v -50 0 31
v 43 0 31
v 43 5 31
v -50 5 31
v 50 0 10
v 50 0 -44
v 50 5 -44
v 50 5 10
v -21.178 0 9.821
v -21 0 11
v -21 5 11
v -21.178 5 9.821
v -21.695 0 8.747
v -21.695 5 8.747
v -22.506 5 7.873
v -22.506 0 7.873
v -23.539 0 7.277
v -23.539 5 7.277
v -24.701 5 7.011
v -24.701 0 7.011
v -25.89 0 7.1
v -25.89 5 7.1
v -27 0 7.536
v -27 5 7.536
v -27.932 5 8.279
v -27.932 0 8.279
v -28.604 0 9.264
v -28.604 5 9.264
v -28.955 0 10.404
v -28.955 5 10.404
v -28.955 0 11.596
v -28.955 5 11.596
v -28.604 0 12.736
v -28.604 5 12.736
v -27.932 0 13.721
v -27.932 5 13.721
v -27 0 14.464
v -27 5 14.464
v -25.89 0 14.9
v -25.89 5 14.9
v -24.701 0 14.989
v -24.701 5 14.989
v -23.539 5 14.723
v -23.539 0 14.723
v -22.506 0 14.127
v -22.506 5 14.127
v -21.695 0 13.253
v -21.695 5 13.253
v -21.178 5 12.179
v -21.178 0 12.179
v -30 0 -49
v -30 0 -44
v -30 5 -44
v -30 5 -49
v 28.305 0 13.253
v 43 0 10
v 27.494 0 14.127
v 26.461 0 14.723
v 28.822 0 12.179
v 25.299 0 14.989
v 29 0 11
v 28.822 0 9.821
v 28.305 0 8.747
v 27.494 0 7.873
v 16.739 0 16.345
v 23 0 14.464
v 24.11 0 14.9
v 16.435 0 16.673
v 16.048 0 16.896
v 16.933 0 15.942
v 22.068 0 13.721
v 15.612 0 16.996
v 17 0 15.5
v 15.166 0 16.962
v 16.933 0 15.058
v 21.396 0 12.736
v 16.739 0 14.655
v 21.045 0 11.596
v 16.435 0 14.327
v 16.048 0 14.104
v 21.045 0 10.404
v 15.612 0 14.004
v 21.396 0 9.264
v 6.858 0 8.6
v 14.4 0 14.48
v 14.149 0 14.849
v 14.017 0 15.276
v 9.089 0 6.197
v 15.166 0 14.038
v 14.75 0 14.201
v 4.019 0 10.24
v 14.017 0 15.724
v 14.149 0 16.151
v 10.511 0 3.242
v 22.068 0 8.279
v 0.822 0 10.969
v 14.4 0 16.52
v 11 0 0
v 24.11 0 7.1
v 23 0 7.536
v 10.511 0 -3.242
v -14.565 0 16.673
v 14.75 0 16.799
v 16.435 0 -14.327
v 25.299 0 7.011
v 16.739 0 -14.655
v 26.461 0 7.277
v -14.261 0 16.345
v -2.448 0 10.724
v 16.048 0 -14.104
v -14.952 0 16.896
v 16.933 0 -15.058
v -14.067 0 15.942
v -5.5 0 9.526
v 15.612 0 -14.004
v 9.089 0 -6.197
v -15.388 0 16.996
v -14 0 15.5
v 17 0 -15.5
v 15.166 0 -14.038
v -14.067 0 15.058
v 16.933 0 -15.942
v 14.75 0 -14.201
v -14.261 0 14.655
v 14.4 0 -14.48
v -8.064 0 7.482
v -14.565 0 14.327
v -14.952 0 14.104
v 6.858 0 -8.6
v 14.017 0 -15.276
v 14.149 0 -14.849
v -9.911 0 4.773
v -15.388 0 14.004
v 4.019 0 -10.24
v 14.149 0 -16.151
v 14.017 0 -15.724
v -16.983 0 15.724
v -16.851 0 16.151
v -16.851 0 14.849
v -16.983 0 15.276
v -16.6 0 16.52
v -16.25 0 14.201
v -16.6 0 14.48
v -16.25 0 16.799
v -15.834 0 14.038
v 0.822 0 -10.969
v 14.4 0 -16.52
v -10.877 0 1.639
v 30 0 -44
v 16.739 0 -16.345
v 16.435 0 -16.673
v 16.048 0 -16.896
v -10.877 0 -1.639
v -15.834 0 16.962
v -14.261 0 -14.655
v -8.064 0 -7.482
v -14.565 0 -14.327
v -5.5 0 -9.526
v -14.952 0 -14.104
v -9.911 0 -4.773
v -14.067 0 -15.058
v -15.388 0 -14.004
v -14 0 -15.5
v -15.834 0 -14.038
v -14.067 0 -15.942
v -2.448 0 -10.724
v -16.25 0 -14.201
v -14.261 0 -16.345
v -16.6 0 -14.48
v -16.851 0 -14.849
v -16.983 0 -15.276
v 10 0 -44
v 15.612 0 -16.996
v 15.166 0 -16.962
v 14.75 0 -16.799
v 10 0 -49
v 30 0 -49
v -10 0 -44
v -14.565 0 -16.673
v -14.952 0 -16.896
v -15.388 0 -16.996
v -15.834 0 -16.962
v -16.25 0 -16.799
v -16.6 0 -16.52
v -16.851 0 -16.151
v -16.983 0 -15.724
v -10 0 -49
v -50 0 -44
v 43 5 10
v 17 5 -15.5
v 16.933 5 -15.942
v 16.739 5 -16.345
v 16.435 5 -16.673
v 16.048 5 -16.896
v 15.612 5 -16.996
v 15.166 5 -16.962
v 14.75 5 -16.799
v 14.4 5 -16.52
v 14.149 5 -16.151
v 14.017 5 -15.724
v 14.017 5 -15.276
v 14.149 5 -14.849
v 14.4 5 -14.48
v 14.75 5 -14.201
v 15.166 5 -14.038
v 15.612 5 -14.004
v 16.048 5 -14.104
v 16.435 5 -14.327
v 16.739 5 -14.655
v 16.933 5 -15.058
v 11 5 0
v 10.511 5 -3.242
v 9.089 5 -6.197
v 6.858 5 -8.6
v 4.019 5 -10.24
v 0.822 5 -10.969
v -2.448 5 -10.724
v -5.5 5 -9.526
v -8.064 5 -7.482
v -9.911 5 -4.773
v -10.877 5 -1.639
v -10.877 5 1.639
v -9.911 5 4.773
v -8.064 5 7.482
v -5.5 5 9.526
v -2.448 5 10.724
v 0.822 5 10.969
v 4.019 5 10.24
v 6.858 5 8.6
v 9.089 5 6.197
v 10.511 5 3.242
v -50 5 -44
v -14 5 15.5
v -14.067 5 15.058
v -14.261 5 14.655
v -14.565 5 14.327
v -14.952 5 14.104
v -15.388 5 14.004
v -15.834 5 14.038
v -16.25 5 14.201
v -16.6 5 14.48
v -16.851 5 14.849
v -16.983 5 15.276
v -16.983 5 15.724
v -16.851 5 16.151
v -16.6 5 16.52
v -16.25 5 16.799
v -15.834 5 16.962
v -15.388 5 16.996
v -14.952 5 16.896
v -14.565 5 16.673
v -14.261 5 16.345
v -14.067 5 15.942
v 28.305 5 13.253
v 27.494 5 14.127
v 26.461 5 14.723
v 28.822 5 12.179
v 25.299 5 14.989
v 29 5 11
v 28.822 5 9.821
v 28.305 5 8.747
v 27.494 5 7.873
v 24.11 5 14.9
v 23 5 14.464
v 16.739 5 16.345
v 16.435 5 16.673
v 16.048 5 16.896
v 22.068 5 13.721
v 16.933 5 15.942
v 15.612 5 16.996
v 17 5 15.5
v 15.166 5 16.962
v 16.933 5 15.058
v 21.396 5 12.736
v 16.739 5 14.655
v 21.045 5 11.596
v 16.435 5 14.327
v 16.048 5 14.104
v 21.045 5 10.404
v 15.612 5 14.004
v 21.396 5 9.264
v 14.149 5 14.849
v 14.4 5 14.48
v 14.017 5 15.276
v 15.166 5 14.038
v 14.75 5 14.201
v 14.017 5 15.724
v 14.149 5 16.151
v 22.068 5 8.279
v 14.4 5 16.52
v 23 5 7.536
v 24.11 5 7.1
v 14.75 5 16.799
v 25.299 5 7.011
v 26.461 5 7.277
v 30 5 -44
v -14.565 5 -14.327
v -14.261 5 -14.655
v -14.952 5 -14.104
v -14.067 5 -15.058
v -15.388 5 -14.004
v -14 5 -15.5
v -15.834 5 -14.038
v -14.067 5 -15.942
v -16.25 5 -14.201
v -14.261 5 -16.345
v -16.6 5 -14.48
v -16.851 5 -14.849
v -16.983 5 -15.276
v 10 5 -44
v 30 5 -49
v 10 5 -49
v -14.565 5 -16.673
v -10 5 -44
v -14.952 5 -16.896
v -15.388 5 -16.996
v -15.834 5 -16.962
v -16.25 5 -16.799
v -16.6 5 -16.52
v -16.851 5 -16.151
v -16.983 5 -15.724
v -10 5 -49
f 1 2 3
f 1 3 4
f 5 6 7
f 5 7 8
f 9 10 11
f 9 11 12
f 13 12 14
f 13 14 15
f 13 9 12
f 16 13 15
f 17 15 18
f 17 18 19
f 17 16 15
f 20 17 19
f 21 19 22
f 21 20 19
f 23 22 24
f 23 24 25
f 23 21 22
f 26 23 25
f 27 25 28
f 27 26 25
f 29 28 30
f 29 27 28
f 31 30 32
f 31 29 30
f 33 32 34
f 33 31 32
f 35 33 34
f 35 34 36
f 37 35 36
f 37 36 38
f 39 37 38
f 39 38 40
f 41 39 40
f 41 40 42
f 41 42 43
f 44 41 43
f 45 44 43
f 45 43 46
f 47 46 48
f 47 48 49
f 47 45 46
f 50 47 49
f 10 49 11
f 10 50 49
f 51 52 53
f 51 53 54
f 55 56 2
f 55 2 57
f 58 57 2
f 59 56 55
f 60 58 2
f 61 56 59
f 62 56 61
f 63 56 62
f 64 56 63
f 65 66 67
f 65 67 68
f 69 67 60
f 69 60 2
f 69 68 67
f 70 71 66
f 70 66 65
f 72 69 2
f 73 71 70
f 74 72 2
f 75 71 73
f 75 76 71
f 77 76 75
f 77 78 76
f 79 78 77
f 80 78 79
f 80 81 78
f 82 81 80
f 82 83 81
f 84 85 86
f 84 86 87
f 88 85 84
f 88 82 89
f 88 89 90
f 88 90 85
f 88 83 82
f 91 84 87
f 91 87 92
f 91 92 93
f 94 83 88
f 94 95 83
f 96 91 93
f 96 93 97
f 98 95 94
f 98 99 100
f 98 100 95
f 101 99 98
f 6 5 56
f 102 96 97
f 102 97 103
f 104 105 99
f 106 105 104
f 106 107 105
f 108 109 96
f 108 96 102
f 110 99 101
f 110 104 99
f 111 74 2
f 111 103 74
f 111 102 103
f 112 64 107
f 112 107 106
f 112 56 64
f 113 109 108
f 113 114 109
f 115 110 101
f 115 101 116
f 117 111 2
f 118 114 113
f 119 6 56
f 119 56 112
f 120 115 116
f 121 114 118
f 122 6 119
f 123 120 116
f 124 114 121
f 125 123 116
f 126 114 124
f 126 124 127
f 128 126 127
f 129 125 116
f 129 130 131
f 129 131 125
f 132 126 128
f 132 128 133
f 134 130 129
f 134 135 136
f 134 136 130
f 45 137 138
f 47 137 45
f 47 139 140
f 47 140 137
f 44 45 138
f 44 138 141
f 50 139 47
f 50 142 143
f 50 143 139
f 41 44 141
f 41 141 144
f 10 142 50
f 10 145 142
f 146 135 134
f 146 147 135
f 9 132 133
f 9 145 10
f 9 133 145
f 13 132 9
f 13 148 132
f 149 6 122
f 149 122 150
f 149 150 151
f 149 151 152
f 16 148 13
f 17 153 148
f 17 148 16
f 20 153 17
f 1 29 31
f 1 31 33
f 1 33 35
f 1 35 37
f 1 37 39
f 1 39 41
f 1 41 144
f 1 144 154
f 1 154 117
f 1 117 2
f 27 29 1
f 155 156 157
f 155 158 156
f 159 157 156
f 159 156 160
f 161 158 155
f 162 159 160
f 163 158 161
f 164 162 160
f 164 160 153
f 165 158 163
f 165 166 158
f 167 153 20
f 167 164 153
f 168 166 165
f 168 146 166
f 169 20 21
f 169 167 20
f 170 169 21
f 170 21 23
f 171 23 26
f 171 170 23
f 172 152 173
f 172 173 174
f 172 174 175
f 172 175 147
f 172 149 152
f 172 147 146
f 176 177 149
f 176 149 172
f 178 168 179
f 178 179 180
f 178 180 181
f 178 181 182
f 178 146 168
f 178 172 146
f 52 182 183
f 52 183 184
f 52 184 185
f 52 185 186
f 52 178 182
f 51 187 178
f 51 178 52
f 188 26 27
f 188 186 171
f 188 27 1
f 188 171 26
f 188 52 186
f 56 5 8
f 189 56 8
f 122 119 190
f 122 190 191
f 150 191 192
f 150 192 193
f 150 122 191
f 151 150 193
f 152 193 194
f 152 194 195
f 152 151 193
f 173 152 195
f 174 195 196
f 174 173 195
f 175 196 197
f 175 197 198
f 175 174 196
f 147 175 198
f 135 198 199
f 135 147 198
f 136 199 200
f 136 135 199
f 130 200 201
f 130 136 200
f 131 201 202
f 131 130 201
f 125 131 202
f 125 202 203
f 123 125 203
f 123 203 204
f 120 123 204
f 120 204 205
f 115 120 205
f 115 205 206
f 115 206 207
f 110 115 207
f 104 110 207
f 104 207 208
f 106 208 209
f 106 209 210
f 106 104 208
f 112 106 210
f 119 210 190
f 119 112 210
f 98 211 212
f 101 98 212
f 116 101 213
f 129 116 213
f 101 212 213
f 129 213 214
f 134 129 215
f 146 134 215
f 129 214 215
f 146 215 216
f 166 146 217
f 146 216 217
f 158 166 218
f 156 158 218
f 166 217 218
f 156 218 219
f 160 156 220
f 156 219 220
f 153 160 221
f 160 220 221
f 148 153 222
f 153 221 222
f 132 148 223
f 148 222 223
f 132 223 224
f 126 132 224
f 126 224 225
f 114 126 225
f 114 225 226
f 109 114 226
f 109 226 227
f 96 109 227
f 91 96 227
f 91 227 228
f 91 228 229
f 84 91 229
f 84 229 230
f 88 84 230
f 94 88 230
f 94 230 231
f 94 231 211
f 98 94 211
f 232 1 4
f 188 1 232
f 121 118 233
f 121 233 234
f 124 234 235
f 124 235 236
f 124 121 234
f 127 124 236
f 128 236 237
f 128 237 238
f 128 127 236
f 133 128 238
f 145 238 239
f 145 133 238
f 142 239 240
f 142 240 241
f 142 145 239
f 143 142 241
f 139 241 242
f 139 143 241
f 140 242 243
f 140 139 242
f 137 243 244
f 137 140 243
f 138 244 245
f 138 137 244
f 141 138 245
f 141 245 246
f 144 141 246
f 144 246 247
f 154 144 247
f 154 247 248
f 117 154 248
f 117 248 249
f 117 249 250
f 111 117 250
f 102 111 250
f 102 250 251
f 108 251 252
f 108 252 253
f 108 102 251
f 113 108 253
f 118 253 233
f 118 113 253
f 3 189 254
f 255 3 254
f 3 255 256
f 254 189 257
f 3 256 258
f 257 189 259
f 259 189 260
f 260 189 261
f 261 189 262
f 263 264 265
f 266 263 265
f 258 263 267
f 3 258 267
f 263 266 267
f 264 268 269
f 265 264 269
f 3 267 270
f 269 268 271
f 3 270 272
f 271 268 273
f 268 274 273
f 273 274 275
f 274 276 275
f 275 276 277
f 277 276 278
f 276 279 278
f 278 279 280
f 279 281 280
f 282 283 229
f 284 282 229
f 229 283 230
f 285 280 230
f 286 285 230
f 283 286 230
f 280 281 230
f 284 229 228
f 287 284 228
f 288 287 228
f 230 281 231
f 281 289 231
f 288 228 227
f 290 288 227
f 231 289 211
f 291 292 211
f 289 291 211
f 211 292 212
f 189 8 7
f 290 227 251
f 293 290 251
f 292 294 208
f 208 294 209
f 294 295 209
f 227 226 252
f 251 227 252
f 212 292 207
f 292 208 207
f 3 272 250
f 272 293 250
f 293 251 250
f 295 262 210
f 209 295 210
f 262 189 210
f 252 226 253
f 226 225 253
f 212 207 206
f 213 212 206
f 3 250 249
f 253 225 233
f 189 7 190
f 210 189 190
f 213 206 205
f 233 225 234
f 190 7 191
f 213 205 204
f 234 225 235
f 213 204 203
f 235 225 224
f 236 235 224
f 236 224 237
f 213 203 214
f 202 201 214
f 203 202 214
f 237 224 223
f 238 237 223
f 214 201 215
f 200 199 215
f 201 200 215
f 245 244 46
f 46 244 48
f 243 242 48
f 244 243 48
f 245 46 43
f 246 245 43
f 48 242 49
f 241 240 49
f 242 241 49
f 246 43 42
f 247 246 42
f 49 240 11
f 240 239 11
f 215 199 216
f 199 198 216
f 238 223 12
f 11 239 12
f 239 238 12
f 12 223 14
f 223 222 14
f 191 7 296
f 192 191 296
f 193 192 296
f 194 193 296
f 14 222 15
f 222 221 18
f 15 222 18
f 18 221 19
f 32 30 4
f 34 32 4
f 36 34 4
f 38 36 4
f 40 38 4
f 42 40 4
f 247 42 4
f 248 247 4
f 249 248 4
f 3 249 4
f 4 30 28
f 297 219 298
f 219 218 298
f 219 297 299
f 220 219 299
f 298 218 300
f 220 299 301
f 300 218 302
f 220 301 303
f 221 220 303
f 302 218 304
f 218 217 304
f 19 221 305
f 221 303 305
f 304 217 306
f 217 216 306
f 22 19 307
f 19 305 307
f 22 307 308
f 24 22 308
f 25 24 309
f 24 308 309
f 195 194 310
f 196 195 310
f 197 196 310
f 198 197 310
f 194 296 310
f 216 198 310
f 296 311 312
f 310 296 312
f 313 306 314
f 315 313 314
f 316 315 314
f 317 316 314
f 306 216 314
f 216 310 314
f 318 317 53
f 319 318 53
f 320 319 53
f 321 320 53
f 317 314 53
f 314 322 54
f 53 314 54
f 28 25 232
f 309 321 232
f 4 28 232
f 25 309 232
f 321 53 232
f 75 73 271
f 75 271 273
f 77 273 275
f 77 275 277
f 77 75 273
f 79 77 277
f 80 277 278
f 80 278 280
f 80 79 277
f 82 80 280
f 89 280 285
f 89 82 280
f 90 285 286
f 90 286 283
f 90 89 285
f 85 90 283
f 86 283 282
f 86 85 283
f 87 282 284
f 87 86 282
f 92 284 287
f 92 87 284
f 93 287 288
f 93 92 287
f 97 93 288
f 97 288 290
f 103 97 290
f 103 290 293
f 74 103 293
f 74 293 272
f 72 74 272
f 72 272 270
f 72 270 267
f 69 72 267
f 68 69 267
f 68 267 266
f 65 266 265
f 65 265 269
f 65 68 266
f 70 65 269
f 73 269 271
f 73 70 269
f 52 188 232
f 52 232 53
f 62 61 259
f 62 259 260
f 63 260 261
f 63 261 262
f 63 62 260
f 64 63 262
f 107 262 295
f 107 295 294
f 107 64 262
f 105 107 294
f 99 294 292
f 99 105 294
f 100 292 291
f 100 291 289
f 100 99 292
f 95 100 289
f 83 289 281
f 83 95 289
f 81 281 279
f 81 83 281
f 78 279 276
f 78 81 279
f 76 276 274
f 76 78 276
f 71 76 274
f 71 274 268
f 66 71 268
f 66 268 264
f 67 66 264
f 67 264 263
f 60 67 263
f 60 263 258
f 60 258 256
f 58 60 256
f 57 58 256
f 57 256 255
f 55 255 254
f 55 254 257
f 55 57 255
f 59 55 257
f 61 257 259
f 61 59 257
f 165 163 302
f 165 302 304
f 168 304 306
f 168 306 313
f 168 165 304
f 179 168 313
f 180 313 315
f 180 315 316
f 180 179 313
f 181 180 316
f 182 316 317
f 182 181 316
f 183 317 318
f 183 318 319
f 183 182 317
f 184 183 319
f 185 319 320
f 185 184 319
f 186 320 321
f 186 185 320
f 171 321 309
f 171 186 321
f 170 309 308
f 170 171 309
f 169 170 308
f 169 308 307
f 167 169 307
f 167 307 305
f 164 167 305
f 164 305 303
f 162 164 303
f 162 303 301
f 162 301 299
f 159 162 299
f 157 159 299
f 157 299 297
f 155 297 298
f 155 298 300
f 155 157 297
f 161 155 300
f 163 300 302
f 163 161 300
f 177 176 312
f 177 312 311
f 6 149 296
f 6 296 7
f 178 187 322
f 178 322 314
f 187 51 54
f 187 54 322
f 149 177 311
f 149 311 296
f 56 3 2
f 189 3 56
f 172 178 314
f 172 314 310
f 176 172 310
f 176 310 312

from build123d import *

# Parameters (mm, degrees)
SKETCH1_R           = 4
SKETCH1_R_2         = 1.5
BOSS_EXTRUDE1_DEPTH = 5
CUT_EXTRUDE1_REACH  = 7
SKETCH2_R           = 11
SKETCH3_W           = 21
SKETCH3_H           = 5
CUT_EXTRUDE2_DEPTH  = 7


with BuildPart() as part:
    # Sketch1 → Boss-Extrude1 (new body)
    with BuildSketch(Plane(origin=(0, 0, 0), x_dir=(1, 0, 0), z_dir=(0, 1, 0))):
        Polygon((-50, 44), (-30, 44), (-30, 49), (-10, 49), (-10, 44), (10, 44), (10, 49), (30, 49), (30, 44), (50, 44), (50, -31), (-50, -31), align=None)
        Circle(SKETCH1_R, mode=Mode.SUBTRACT)
        with Locations((15.5, 15.5)):
            Circle(SKETCH1_R_2, mode=Mode.SUBTRACT)
        with Locations((-15.5, 15.5)):
            Circle(SKETCH1_R_2, mode=Mode.SUBTRACT)
        with Locations((-15.5, -15.5)):
            Circle(SKETCH1_R_2, mode=Mode.SUBTRACT)
        with Locations((15.5, -15.5)):
            Circle(SKETCH1_R_2, mode=Mode.SUBTRACT)
        with Locations((-25, -11)):
            Circle(SKETCH1_R, mode=Mode.SUBTRACT)
        with Locations((25, -11)):
            Circle(SKETCH1_R, mode=Mode.SUBTRACT)
    extrude(amount=BOSS_EXTRUDE1_DEPTH)

    # Sketch2 → Cut-Extrude1 (cut, up to next)
    with BuildSketch(Plane(origin=(0, 5, 0), x_dir=(1, 0, 0), z_dir=(0, 1, 0)), mode=Mode.PRIVATE) as cut_extrude1_sk1:
        Circle(SKETCH2_R)
    cut_extrude1_tool1 = extrude(cut_extrude1_sk1.sketch, amount=-CUT_EXTRUDE1_REACH, mode=Mode.PRIVATE) & part.part
    add(cut_extrude1_tool1.solids().sort_by_distance((0, 5, 0))[0], mode=Mode.SUBTRACT)

    # Sketch3 → Cut-Extrude2 (cut)
    with BuildSketch(Plane(origin=(50, 0, 0), x_dir=(0, 0, -1), z_dir=(1, 0, 0))):
        with Locations((-20.5, 2.5)):
            Rectangle(SKETCH3_W, SKETCH3_H)
    extrude(amount=-CUT_EXTRUDE2_DEPTH, mode=Mode.SUBTRACT)


solid = part.part
